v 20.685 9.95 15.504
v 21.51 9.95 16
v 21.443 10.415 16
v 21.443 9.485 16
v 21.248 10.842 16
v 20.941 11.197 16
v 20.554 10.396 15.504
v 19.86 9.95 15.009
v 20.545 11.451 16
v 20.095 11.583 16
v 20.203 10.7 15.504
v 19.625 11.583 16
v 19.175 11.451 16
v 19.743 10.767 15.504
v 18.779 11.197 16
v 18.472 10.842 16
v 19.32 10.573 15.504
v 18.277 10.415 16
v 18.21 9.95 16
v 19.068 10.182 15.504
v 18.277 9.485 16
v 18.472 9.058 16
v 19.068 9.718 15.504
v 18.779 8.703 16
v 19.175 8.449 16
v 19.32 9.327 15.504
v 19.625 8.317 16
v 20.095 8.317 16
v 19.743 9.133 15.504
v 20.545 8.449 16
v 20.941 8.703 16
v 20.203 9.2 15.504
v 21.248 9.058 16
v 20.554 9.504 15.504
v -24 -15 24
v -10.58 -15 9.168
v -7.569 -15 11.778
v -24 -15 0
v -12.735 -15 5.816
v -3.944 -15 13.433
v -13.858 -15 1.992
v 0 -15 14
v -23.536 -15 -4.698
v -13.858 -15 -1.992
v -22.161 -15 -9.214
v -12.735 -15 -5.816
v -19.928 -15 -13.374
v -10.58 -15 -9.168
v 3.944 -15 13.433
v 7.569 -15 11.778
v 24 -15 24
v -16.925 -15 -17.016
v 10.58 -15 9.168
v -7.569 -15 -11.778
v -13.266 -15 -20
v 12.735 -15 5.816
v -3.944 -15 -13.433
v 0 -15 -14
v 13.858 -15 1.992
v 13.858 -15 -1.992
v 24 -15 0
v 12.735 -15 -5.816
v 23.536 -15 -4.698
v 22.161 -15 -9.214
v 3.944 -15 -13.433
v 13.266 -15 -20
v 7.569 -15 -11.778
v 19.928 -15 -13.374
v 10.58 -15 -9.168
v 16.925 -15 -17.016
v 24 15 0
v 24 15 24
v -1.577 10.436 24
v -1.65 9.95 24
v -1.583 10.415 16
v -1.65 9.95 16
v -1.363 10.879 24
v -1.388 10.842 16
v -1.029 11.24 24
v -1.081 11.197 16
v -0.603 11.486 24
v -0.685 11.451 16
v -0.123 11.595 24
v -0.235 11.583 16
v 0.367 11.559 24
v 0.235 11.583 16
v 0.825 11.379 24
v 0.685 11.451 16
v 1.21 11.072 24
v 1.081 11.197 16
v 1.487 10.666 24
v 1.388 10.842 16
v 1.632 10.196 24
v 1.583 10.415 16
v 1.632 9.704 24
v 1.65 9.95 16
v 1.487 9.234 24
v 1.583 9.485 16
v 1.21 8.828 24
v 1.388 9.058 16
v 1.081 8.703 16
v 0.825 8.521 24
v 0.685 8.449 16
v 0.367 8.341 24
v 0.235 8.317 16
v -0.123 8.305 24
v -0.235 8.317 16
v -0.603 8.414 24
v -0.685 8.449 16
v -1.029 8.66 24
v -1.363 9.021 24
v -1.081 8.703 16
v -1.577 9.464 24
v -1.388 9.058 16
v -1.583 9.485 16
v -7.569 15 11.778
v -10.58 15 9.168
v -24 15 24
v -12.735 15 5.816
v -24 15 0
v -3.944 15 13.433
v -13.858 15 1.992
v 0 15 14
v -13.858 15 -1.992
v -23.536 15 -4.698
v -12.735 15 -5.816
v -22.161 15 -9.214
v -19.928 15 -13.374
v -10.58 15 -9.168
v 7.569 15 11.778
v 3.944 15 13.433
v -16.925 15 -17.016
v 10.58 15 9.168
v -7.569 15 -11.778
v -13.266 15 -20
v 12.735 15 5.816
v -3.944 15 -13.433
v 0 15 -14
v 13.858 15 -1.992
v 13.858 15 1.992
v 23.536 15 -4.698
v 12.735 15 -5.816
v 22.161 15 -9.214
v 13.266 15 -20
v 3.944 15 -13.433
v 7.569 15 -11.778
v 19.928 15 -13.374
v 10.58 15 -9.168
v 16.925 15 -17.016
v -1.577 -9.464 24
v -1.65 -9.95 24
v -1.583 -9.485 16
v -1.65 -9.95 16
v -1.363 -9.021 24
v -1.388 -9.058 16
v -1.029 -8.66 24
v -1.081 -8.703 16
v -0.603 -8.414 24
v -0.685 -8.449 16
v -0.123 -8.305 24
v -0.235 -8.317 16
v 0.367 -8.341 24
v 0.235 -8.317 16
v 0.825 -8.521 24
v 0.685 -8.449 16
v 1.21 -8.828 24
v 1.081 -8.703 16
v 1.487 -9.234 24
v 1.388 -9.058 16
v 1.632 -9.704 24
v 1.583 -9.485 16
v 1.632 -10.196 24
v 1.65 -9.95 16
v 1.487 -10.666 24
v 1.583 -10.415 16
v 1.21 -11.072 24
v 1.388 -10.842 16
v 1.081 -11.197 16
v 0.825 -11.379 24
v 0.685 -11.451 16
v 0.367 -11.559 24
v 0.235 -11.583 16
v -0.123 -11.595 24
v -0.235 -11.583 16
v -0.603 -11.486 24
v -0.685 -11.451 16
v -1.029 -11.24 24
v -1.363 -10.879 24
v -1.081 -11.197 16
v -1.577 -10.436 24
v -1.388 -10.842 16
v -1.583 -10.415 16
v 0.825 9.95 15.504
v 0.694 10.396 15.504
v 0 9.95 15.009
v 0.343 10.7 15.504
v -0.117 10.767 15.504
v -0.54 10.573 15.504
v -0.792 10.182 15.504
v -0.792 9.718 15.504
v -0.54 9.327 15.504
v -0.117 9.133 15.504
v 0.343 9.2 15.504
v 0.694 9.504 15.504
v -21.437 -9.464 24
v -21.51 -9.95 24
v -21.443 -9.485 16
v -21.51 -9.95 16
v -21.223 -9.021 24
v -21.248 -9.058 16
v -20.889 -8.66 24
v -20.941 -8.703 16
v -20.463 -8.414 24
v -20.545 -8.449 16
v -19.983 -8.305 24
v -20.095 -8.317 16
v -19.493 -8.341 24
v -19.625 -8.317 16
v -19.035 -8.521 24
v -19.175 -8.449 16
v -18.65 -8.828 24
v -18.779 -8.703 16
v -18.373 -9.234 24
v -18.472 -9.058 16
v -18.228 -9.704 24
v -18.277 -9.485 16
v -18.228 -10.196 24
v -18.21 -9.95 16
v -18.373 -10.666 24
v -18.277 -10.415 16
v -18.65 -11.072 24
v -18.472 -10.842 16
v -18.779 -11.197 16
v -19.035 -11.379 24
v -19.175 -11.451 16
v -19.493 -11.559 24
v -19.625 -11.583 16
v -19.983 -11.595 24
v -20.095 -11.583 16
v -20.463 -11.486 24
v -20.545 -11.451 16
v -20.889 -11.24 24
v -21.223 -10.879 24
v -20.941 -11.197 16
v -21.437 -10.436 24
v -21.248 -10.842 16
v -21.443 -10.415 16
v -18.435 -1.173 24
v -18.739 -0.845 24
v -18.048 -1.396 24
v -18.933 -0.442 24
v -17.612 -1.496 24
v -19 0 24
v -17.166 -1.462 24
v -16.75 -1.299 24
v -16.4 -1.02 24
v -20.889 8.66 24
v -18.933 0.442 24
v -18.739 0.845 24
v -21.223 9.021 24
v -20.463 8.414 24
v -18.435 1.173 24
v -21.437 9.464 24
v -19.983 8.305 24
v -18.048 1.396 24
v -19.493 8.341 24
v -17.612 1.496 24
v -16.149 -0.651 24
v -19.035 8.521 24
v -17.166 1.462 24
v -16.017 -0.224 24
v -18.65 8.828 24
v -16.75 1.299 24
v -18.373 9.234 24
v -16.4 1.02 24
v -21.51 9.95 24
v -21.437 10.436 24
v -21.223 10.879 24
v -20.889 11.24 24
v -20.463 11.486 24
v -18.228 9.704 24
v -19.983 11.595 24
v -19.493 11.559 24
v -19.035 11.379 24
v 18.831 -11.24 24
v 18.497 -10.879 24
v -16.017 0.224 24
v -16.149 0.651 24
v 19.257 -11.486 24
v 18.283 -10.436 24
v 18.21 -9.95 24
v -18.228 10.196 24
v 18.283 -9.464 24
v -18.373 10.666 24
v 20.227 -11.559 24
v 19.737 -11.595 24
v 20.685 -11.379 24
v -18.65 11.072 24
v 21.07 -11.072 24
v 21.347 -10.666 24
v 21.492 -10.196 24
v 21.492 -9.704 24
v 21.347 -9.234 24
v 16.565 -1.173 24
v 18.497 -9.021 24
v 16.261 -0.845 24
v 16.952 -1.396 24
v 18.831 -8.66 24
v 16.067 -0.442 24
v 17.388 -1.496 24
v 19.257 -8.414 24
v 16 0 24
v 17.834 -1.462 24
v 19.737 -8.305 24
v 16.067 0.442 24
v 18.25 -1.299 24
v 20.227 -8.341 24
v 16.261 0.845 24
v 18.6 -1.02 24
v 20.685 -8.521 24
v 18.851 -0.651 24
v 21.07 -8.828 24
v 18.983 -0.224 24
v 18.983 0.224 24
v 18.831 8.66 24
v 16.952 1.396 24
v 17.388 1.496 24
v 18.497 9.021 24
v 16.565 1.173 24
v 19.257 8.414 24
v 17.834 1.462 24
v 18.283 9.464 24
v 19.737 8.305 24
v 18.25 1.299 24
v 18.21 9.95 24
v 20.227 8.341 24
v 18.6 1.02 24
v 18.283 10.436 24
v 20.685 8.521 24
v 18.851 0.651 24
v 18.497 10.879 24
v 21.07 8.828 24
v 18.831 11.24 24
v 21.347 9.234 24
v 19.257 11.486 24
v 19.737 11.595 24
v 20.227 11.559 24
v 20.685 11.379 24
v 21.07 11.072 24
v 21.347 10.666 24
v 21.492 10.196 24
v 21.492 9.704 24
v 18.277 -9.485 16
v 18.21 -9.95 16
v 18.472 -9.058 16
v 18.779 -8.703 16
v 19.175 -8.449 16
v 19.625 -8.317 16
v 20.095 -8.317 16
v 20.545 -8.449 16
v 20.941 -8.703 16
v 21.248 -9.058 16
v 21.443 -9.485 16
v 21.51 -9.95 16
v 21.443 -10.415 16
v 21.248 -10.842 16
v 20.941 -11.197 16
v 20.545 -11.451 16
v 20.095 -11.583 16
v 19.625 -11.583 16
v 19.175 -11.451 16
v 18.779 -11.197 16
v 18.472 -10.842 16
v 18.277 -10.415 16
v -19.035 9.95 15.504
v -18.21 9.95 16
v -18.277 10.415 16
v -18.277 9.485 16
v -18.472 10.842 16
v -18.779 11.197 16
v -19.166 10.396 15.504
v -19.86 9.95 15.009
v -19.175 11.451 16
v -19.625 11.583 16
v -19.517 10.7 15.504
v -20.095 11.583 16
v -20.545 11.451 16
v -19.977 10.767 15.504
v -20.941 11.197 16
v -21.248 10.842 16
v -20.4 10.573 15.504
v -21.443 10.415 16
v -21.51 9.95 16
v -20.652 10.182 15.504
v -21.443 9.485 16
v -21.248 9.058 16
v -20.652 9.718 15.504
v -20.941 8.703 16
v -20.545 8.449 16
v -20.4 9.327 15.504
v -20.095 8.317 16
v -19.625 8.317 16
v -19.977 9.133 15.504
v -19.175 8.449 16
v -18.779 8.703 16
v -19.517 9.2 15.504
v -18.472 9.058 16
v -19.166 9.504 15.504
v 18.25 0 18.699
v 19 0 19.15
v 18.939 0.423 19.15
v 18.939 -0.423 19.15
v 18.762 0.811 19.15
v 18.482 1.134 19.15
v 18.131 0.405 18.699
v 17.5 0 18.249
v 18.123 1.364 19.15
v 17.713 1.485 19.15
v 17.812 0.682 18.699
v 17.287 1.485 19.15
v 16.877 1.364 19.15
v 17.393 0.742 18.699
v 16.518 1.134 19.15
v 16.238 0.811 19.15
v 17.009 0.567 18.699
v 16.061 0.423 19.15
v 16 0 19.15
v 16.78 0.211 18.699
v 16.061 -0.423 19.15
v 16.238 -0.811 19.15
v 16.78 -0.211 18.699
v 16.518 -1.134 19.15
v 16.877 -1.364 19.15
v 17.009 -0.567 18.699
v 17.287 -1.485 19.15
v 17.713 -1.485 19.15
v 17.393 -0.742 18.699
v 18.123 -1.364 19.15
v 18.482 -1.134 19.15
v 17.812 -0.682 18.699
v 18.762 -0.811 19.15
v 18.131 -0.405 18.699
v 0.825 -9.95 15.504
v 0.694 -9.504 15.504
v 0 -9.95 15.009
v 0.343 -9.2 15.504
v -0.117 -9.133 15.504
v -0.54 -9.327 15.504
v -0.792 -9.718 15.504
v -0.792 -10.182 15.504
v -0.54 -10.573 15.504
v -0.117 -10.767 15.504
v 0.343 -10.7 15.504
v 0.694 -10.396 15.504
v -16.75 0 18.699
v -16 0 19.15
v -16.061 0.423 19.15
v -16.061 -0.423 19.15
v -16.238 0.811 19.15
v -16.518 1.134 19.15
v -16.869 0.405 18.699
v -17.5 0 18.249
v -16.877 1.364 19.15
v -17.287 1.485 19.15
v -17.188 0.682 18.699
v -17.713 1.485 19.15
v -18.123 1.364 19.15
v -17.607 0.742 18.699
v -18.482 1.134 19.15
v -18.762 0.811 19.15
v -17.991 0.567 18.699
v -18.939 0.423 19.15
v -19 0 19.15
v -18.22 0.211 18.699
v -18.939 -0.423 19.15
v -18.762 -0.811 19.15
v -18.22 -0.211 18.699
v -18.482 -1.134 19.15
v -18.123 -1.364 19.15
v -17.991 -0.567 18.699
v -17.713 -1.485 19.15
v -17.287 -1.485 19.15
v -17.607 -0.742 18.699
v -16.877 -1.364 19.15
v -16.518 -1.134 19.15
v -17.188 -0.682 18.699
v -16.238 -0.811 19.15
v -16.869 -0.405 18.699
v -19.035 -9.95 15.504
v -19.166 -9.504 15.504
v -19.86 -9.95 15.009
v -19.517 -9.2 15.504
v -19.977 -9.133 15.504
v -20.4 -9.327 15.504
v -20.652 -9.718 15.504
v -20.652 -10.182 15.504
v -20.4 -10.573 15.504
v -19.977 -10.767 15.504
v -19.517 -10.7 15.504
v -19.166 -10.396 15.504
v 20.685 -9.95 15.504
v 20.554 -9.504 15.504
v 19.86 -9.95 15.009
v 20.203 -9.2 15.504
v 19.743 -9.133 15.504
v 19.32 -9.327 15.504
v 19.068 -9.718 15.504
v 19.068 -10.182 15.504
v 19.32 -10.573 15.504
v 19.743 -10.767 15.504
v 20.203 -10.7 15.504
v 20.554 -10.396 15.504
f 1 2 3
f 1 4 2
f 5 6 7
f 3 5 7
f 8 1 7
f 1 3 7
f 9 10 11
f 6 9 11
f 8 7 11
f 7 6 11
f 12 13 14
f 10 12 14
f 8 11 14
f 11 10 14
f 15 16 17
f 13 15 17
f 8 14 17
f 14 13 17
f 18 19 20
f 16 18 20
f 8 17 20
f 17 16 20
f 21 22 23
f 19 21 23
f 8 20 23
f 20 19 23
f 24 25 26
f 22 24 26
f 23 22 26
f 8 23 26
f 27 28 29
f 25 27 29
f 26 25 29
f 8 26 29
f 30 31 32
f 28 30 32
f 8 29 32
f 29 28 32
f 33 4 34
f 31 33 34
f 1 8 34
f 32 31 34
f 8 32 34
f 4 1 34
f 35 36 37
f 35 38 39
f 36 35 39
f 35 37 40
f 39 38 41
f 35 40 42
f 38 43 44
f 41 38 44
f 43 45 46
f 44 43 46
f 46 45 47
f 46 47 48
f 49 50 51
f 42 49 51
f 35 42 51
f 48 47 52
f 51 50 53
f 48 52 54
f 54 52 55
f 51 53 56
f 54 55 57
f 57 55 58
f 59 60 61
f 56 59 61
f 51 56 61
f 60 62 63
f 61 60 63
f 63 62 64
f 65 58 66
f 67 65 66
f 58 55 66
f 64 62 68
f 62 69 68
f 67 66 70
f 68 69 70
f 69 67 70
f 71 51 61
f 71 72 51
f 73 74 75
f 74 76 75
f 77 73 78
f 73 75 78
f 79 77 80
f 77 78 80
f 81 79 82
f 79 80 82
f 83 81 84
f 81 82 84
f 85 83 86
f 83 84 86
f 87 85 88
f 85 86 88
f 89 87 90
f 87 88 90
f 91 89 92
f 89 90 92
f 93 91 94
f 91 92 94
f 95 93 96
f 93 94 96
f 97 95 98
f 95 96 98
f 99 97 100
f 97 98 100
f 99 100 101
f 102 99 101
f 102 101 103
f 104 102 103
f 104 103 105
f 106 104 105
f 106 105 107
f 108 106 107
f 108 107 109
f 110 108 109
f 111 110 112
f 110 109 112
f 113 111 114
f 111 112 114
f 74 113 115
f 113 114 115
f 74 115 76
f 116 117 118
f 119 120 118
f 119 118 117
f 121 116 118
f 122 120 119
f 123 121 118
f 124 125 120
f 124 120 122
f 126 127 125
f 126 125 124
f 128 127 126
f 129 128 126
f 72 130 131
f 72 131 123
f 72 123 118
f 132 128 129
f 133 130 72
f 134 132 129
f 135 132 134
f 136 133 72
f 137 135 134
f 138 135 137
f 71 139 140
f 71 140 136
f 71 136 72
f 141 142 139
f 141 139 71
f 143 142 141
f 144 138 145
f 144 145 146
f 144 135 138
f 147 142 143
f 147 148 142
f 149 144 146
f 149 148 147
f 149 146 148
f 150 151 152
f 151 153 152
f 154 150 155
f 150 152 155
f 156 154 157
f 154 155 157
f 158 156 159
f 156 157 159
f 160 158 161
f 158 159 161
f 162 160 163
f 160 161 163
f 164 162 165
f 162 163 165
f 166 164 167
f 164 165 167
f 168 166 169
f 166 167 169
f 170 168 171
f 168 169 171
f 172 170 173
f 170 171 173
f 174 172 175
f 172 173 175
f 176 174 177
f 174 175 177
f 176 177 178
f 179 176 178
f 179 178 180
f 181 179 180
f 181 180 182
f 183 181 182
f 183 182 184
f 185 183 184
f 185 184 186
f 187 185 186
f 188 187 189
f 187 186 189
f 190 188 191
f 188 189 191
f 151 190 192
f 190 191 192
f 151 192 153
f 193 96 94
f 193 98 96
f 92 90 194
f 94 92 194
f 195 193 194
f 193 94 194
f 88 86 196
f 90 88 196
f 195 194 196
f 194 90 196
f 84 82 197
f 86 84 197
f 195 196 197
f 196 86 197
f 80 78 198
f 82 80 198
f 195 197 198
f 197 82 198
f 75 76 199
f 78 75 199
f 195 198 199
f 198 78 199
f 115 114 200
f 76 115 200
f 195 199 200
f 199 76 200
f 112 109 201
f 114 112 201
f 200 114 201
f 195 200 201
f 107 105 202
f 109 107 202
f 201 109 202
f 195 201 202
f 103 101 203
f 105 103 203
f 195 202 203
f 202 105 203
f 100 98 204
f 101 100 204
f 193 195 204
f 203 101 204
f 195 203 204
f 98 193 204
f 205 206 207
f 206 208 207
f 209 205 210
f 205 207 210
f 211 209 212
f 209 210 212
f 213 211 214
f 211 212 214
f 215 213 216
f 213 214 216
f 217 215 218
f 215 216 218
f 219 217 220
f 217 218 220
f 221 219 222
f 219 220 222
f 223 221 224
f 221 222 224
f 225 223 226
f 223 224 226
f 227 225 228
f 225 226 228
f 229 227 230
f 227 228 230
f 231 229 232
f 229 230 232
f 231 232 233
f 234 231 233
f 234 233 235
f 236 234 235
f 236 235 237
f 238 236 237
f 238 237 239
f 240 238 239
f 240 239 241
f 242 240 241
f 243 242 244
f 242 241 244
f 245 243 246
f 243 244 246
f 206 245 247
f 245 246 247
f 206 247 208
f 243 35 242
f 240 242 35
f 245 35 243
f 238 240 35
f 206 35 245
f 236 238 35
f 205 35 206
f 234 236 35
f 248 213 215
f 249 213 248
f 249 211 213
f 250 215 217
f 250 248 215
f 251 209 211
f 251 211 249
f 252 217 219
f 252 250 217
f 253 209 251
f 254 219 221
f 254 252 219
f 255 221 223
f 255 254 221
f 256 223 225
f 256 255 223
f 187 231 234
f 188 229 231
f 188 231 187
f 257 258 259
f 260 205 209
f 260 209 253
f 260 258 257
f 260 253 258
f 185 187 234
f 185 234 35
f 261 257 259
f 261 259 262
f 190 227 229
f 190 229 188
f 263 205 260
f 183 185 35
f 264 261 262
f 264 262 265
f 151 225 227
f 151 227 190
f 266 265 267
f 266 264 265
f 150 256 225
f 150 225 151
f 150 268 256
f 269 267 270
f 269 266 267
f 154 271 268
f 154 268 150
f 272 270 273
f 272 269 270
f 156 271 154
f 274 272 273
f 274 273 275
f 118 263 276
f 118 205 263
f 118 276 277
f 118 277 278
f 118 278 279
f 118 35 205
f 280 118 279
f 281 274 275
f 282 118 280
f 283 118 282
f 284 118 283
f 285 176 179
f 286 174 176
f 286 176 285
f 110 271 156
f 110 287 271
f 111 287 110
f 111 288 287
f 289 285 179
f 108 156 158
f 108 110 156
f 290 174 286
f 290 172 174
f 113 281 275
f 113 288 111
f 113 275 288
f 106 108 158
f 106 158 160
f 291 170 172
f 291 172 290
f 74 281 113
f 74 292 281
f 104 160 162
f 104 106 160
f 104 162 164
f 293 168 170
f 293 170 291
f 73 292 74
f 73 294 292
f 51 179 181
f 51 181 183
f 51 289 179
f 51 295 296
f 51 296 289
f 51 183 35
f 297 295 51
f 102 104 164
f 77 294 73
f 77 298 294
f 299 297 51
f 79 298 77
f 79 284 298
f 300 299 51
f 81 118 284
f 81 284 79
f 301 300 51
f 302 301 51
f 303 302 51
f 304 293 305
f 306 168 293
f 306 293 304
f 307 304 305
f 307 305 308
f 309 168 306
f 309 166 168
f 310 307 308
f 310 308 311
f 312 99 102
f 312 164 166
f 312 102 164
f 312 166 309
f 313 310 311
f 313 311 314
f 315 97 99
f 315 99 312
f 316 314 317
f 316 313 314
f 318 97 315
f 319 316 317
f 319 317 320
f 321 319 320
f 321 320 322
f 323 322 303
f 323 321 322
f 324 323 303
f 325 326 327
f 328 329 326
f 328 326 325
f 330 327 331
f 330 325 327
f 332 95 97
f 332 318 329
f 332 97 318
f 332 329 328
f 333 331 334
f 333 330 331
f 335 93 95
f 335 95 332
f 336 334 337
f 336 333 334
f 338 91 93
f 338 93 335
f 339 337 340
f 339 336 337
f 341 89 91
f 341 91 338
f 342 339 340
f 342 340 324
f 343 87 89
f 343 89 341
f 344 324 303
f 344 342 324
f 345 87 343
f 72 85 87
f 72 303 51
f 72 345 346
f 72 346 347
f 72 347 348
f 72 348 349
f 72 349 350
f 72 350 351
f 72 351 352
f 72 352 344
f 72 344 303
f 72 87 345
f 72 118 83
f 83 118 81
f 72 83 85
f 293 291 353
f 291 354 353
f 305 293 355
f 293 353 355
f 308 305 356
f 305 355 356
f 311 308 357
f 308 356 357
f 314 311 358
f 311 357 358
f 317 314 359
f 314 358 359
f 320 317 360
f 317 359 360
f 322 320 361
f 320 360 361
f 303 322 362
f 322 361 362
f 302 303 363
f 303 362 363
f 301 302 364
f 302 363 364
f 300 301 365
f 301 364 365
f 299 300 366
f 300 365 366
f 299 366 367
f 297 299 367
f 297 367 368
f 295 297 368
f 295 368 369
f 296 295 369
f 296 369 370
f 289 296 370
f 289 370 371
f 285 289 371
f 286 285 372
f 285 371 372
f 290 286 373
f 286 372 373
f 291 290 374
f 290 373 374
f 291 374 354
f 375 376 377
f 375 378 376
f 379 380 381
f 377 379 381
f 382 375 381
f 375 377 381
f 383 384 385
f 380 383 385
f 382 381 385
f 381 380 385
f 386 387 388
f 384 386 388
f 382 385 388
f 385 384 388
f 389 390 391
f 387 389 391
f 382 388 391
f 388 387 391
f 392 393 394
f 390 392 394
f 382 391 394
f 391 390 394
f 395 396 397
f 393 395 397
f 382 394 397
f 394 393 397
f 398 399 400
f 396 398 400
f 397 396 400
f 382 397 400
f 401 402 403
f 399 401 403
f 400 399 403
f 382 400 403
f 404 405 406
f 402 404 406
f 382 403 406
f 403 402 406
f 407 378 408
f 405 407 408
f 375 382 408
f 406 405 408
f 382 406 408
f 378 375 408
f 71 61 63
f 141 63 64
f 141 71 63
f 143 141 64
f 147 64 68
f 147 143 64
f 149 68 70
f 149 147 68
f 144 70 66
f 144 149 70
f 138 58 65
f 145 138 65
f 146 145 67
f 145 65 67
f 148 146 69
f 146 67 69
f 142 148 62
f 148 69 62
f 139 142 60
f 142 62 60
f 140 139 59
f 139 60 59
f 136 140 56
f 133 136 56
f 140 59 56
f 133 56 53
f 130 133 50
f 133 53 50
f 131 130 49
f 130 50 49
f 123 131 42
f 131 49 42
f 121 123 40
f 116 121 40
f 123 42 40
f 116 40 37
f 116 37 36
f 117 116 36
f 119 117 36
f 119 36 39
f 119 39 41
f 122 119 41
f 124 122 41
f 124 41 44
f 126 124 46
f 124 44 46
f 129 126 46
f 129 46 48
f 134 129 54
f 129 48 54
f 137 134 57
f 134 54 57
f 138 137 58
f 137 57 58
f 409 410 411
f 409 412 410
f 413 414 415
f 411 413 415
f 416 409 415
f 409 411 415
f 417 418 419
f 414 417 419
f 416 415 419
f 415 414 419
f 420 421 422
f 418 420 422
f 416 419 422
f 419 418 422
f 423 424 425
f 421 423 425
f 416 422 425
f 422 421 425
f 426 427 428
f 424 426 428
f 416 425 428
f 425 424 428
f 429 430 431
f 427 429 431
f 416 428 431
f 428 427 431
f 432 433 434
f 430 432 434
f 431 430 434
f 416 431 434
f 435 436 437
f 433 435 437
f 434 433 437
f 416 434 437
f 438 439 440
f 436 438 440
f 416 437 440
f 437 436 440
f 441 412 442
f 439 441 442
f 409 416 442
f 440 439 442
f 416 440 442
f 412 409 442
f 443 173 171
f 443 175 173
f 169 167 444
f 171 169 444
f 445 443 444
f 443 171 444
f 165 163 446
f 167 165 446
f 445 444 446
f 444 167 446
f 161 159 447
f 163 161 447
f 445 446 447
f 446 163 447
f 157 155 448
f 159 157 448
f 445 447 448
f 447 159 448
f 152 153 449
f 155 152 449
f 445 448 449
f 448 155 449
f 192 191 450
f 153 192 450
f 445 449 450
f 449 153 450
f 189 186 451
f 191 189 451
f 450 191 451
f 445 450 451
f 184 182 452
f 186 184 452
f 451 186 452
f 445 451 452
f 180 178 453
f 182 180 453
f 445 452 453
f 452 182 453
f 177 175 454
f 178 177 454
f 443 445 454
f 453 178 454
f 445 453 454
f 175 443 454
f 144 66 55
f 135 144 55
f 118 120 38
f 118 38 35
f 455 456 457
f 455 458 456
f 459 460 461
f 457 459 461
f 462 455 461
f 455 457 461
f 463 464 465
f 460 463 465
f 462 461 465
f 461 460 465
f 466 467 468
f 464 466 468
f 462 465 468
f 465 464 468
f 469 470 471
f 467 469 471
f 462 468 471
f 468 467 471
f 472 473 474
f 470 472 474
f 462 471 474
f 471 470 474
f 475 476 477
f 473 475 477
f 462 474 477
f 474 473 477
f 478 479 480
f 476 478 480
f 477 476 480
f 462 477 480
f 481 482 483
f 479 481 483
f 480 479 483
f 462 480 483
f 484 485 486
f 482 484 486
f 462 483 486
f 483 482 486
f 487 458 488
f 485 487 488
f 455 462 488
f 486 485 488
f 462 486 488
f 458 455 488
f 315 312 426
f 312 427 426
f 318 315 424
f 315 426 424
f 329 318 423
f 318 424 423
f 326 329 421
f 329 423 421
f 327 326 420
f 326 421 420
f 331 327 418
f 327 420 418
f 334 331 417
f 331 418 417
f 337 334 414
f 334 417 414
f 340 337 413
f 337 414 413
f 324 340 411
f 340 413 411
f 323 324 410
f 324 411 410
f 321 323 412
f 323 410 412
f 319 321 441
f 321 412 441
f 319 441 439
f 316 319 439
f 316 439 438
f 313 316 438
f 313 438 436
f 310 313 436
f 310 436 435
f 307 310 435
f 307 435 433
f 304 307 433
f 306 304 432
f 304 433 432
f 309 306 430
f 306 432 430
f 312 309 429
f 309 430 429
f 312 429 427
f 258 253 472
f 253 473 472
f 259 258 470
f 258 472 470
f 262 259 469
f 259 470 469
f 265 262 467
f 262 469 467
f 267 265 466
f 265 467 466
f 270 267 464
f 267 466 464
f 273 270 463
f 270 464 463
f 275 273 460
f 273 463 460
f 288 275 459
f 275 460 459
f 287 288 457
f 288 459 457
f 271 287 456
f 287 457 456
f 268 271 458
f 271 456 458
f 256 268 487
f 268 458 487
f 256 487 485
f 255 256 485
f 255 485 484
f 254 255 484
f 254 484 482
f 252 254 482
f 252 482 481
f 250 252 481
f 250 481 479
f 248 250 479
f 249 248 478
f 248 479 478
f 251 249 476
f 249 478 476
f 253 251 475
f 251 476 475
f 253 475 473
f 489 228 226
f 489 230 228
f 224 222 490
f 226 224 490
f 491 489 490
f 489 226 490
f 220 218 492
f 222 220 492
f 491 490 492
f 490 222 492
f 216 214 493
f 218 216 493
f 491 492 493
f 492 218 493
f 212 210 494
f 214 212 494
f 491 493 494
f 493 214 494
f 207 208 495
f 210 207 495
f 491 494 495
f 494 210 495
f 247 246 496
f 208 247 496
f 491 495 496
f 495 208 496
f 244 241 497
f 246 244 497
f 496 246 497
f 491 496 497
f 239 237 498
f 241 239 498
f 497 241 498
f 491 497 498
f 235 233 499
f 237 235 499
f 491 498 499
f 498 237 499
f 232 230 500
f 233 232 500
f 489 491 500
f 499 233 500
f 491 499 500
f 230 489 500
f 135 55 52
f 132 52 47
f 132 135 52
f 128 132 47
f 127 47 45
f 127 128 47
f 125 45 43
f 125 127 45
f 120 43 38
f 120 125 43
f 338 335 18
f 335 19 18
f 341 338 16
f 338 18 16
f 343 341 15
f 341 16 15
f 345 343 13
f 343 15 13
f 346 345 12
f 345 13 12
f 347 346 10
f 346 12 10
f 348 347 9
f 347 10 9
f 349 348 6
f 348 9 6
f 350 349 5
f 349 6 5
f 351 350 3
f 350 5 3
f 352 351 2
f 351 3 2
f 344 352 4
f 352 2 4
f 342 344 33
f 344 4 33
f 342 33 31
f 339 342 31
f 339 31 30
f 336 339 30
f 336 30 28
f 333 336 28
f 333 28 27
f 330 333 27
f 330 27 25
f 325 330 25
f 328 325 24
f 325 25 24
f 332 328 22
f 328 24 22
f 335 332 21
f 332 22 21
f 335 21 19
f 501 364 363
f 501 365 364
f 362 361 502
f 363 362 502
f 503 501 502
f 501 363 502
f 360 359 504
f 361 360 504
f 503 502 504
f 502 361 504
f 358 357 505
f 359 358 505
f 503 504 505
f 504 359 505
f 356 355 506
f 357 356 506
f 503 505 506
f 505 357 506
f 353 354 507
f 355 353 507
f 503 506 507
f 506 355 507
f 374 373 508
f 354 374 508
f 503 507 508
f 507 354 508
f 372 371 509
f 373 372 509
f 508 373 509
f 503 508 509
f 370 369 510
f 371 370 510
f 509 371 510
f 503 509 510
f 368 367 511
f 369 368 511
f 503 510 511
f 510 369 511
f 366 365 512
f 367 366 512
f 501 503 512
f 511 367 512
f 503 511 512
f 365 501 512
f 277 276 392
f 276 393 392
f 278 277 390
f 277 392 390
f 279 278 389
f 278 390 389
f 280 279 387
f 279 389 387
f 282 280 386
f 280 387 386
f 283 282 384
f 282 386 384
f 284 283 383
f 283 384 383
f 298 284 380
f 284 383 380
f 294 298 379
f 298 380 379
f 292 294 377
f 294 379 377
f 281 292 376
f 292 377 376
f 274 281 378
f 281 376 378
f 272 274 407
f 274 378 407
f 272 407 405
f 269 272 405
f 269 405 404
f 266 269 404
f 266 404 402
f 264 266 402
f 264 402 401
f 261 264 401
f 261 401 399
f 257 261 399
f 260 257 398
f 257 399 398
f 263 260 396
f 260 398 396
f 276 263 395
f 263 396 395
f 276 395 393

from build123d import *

# Parameters (mm, degrees)
BOSS_EXTRUDE1_DEPTH       = 15
M4X0_7_TAPPED_HOLE1_D     = 3.3
M4X0_7_TAPPED_HOLE1_DEPTH = 8
M4X0_7_TAPPED_HOLE1_TIP   = 0.991420021
F_3_0MM_DOWEL_HOLE1_D     = 3
F_3_0MM_DOWEL_HOLE1_DEPTH = 4.85
F_3_0MM_DOWEL_HOLE1_TIP   = 0.901290929
SKETCH6_R                 = 14
CUT_EXTRUDE1_DEPTH        = 30


with BuildPart() as part:
    # Sketch1 → Boss-Extrude1 (new, symmetric)
    with BuildSketch(Plane(origin=(0, 0, 0), x_dir=(1, 0, 0), z_dir=(0, 1, 0))):
        with BuildLine():
            Line((13.266499161, 20), (-13.266499161, 20))
            ThreePointArc((-13.266499161, 20), (-21.147056295, 11.349097324), (-24, 0))
            Line((-24, 0), (-24, -24))
            Line((-24, -24), (24, -24))
            Line((24, -24), (24, 0))
            ThreePointArc((24, 0), (21.147056295, 11.349097324), (13.266499161, 20))
        make_face()
    extrude(amount=BOSS_EXTRUDE1_DEPTH, both=True)

    # M4x0.7 Tapped Hole1
    with Locations(Plane.XY.offset(24)):
        with Locations((-19.86, 9.95), (0, 9.95), (19.86, 9.95), (19.86, -9.95), (0, -9.95), (-19.86, -9.95)):
            Hole(M4X0_7_TAPPED_HOLE1_D / 2, depth=M4X0_7_TAPPED_HOLE1_DEPTH)
            with Locations((0, 0, -(M4X0_7_TAPPED_HOLE1_DEPTH + M4X0_7_TAPPED_HOLE1_TIP / 2))):  # 118° drill point
                Cone(0, M4X0_7_TAPPED_HOLE1_D / 2, M4X0_7_TAPPED_HOLE1_TIP, mode=Mode.SUBTRACT)

    # Ø3.0mm Dowel Hole1
    with Locations(Plane.XY.offset(24)):
        with Locations((-17.5, 0), (17.5, 0)):
            Hole(F_3_0MM_DOWEL_HOLE1_D / 2, depth=F_3_0MM_DOWEL_HOLE1_DEPTH)
            with Locations((0, 0, -(F_3_0MM_DOWEL_HOLE1_DEPTH + F_3_0MM_DOWEL_HOLE1_TIP / 2))):  # 118° drill point
                Cone(0, F_3_0MM_DOWEL_HOLE1_D / 2, F_3_0MM_DOWEL_HOLE1_TIP, mode=Mode.SUBTRACT)

    # Sketch6 → Cut-Extrude1 (cut)
    with BuildSketch(Plane.XZ.offset(15)):
        Circle(SKETCH6_R)
    extrude(amount=-CUT_EXTRUDE1_DEPTH, mode=Mode.SUBTRACT)


solid = part.part
